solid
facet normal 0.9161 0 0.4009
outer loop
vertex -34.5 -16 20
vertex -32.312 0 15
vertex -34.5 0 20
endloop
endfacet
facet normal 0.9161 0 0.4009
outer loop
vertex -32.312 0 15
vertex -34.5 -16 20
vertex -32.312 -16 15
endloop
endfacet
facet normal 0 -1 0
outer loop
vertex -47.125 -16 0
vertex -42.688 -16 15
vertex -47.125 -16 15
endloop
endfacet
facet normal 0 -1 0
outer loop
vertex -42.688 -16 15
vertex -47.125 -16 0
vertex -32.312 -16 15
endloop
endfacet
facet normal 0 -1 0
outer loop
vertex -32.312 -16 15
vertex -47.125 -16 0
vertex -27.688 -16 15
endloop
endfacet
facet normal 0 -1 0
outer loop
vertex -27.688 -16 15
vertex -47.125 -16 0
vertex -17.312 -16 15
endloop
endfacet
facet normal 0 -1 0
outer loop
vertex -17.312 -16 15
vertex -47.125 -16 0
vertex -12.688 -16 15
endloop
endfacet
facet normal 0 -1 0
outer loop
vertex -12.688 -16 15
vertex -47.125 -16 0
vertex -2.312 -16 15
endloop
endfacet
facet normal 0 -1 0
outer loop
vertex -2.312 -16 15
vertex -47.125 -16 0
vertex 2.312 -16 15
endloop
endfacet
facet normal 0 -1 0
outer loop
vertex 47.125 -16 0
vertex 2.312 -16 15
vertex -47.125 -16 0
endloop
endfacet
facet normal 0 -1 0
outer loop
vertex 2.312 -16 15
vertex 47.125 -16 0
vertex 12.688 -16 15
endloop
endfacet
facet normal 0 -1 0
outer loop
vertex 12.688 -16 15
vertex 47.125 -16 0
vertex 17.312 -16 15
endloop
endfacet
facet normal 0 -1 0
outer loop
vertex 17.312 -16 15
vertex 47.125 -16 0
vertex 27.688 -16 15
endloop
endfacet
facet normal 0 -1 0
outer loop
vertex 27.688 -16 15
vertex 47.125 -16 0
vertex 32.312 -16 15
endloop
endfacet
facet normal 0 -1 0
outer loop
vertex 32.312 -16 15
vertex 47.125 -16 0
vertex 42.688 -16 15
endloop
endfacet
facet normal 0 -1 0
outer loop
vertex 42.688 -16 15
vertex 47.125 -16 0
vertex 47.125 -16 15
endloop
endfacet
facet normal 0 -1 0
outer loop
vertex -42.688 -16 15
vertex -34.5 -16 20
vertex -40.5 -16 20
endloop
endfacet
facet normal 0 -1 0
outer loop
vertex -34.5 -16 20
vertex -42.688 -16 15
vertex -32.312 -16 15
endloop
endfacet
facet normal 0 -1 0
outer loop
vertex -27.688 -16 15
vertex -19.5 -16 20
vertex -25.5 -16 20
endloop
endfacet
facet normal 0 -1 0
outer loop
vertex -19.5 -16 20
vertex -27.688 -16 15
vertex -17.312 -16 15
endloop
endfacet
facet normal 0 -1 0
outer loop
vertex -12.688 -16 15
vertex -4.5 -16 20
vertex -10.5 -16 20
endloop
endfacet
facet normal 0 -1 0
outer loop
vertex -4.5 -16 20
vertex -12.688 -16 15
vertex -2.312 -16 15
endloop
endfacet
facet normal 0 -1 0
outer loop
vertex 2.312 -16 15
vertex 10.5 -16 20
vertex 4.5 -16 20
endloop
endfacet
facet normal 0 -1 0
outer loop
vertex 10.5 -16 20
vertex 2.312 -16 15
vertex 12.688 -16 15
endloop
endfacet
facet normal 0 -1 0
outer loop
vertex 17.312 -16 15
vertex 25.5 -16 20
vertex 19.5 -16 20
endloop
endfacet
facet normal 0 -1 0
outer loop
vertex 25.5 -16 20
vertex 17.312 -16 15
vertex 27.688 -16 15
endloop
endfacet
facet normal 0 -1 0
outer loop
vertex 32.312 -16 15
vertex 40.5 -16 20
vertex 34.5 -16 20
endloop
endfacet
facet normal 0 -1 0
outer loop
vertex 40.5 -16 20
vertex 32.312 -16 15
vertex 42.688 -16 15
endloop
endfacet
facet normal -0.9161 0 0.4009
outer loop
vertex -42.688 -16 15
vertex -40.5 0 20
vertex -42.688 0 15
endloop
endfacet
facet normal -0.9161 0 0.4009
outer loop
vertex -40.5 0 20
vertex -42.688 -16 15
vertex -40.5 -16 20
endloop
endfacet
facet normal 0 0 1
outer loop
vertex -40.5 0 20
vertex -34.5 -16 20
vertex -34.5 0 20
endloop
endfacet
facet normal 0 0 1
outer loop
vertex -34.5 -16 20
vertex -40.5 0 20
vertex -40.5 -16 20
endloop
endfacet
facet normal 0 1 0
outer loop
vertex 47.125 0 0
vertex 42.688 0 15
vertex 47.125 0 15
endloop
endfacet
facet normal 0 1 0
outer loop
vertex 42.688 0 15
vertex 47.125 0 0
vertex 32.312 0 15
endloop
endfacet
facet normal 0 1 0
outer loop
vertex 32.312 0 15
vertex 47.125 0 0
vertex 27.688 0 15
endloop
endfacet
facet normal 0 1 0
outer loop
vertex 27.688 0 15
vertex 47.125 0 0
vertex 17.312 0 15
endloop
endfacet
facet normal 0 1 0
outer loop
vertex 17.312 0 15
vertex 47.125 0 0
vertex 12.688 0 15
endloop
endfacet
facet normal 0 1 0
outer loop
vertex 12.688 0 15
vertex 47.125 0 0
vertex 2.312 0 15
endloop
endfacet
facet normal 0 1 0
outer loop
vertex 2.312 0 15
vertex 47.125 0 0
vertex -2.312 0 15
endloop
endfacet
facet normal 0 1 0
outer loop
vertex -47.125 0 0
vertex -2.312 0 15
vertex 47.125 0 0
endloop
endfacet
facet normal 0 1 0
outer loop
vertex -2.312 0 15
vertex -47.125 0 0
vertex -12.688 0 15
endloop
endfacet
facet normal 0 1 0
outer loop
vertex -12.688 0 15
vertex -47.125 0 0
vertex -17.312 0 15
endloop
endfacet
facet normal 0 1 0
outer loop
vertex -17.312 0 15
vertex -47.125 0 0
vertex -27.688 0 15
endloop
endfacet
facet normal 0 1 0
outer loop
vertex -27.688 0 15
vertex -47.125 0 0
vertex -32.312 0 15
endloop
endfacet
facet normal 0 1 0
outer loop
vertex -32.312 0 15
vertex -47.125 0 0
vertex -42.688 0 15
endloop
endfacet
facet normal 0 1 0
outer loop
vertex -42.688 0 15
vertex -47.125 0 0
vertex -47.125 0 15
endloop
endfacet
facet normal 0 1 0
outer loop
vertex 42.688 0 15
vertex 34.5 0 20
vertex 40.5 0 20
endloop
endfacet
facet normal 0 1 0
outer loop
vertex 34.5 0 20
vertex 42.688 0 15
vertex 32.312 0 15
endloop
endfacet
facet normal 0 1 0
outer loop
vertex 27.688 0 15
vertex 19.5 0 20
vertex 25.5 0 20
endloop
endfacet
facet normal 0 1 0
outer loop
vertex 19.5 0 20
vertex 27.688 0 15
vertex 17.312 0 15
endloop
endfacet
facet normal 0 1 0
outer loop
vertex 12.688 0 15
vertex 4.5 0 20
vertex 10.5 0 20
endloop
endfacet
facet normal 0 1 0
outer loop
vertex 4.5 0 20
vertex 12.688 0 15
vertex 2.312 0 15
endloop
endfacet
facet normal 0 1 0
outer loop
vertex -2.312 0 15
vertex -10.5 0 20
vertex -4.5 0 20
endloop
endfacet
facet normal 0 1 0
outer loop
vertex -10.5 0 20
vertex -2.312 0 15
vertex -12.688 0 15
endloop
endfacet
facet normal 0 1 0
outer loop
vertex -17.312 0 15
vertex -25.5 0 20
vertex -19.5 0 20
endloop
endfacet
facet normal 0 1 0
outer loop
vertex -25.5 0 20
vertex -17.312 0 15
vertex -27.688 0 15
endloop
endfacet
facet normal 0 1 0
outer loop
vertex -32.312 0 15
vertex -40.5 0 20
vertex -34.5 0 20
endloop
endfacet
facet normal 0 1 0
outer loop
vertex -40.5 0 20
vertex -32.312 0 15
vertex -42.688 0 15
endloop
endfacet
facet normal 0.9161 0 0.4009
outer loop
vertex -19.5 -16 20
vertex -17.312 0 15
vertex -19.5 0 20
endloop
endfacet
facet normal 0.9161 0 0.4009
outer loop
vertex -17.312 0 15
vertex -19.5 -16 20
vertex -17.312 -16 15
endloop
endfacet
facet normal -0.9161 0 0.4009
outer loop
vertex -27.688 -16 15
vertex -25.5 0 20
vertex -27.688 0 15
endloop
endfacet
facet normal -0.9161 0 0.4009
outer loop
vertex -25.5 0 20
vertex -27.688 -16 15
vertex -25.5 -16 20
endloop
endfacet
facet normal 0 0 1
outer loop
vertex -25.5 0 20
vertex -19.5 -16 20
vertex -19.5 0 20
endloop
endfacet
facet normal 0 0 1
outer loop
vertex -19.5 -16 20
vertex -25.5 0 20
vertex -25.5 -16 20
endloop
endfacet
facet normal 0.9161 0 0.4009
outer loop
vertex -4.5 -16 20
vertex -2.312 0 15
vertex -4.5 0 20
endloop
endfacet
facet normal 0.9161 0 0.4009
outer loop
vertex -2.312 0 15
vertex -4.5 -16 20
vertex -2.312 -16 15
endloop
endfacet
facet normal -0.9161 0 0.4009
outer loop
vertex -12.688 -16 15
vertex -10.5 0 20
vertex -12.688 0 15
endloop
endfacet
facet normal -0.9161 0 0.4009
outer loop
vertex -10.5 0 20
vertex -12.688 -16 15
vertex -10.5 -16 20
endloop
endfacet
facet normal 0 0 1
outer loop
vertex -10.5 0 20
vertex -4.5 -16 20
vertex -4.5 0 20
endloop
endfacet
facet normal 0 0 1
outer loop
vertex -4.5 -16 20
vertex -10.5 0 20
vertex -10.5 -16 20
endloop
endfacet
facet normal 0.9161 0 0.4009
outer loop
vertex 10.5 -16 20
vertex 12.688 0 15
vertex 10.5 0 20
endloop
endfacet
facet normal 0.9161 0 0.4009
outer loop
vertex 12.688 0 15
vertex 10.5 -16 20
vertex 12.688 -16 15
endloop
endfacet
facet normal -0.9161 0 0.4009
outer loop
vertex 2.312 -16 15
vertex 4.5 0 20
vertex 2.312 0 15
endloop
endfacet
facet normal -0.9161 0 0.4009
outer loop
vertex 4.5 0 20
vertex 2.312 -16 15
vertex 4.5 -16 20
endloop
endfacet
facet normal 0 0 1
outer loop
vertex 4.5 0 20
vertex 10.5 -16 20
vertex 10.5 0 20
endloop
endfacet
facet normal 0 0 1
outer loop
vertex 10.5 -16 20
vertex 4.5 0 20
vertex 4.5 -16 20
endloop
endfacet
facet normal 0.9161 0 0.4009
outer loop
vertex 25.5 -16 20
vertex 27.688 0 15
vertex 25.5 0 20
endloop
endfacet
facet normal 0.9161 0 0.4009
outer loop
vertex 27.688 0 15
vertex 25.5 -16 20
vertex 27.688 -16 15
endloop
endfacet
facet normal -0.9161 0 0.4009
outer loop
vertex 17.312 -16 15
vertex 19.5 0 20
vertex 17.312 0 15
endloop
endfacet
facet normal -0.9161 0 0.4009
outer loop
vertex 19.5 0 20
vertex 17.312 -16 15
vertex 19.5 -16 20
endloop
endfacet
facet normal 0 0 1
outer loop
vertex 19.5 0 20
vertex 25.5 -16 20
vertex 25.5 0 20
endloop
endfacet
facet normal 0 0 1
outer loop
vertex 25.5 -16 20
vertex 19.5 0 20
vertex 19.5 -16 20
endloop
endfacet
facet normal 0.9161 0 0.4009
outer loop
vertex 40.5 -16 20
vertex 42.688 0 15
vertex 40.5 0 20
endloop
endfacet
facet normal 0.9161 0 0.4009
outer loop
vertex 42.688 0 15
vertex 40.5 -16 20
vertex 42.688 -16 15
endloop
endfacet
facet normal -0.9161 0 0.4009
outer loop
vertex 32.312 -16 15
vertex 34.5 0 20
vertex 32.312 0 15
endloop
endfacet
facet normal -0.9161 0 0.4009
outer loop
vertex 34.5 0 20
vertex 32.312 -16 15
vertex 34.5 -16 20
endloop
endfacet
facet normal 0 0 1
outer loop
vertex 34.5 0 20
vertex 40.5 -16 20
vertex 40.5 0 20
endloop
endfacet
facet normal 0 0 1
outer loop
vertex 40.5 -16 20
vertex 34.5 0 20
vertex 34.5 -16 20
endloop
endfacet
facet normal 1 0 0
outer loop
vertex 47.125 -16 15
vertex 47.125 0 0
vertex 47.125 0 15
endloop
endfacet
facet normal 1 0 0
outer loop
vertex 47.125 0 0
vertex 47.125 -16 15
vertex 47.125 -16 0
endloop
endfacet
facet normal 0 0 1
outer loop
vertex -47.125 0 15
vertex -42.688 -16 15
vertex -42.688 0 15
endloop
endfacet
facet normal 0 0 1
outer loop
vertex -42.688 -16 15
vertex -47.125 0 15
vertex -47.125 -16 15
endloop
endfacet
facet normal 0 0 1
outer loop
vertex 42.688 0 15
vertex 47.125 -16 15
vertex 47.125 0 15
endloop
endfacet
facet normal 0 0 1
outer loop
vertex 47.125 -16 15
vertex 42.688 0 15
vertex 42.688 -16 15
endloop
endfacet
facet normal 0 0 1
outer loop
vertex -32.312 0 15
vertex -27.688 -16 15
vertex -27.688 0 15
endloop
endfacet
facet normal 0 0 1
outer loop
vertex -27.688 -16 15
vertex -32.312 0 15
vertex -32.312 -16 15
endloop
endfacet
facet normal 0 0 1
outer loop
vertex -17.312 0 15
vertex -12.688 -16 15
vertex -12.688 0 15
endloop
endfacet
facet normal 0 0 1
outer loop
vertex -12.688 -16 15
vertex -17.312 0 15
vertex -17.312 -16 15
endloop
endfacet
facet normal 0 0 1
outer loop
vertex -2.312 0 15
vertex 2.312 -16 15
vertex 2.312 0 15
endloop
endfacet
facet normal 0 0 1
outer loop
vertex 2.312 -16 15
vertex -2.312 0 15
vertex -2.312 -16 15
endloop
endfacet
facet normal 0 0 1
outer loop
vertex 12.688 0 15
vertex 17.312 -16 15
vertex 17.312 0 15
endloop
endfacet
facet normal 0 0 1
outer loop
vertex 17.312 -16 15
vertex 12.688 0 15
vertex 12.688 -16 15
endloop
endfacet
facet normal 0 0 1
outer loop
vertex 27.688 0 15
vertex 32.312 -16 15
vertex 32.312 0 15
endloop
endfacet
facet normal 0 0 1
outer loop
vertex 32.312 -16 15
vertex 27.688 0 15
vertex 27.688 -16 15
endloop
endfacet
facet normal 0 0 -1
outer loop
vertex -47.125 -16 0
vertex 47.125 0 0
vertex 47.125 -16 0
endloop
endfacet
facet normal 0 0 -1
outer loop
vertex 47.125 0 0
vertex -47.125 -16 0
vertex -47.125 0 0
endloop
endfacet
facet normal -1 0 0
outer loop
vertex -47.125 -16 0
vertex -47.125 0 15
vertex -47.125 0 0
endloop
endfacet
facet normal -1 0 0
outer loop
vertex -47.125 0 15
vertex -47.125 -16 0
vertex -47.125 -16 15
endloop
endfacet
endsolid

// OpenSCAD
$fn = 32;

// ----------------------------------------------------------------------
// Toothed rack, 6 teeth
// 15 mm pitch, 5 mm teeth
// ----------------------------------------------------------------------

// --- parameters (mm) ---
bar_w = 16;      // bar width (Y)
bar_h = 15;      // bar height (Z)
teeth = 6;       // number of teeth
pitch = 15;      // tooth pitch
tooth_h = 5;     // tooth height above the bar
root_w = 11.25;  // tooth width at the root
crest_w = 6;     // tooth width at the crest

// --- derived feature positions (mm) ---
span = (teeth - 1) * pitch;  // = 75   distance between the outer teeth
bar_l = span + root_w + 8;   // = 94.25   bar length: teeth plus 4 mm at each end
tooth_x = -span / 2;         // = -37.5   X of the first tooth
height = bar_h + tooth_h;    // = 20   overall height
feature_centers = [
  [tooth_x + 0 * pitch, -bar_w / 2],
  [tooth_x + 1 * pitch, -bar_w / 2],
  [tooth_x + 2 * pitch, -bar_w / 2],
  [tooth_x + 3 * pitch, -bar_w / 2],
  [tooth_x + 4 * pitch, -bar_w / 2],
  [tooth_x + 5 * pitch, -bar_w / 2]
];   // tooth centre line, drives the tooth loop

// bar with a rack of teeth, one extruded trapezoium per centre
module rack_tooth() {
  linear_extrude(height = bar_w)
    polygon(points = [
      [0, 0],
      [root_w, 0],
      [root_w / 2 + crest_w / 2, tooth_h + 1],
      [root_w / 2 - crest_w / 2, tooth_h + 1]
    ]);
}

union() {
  translate([-bar_l / 2, -bar_w, 0]) cube([bar_l, bar_w, bar_h]);
  for (centre = feature_centers)
    translate([centre[0] - root_w / 2, 0, bar_h - 1]) rotate([90, 0, 0]) rack_tooth();
}
